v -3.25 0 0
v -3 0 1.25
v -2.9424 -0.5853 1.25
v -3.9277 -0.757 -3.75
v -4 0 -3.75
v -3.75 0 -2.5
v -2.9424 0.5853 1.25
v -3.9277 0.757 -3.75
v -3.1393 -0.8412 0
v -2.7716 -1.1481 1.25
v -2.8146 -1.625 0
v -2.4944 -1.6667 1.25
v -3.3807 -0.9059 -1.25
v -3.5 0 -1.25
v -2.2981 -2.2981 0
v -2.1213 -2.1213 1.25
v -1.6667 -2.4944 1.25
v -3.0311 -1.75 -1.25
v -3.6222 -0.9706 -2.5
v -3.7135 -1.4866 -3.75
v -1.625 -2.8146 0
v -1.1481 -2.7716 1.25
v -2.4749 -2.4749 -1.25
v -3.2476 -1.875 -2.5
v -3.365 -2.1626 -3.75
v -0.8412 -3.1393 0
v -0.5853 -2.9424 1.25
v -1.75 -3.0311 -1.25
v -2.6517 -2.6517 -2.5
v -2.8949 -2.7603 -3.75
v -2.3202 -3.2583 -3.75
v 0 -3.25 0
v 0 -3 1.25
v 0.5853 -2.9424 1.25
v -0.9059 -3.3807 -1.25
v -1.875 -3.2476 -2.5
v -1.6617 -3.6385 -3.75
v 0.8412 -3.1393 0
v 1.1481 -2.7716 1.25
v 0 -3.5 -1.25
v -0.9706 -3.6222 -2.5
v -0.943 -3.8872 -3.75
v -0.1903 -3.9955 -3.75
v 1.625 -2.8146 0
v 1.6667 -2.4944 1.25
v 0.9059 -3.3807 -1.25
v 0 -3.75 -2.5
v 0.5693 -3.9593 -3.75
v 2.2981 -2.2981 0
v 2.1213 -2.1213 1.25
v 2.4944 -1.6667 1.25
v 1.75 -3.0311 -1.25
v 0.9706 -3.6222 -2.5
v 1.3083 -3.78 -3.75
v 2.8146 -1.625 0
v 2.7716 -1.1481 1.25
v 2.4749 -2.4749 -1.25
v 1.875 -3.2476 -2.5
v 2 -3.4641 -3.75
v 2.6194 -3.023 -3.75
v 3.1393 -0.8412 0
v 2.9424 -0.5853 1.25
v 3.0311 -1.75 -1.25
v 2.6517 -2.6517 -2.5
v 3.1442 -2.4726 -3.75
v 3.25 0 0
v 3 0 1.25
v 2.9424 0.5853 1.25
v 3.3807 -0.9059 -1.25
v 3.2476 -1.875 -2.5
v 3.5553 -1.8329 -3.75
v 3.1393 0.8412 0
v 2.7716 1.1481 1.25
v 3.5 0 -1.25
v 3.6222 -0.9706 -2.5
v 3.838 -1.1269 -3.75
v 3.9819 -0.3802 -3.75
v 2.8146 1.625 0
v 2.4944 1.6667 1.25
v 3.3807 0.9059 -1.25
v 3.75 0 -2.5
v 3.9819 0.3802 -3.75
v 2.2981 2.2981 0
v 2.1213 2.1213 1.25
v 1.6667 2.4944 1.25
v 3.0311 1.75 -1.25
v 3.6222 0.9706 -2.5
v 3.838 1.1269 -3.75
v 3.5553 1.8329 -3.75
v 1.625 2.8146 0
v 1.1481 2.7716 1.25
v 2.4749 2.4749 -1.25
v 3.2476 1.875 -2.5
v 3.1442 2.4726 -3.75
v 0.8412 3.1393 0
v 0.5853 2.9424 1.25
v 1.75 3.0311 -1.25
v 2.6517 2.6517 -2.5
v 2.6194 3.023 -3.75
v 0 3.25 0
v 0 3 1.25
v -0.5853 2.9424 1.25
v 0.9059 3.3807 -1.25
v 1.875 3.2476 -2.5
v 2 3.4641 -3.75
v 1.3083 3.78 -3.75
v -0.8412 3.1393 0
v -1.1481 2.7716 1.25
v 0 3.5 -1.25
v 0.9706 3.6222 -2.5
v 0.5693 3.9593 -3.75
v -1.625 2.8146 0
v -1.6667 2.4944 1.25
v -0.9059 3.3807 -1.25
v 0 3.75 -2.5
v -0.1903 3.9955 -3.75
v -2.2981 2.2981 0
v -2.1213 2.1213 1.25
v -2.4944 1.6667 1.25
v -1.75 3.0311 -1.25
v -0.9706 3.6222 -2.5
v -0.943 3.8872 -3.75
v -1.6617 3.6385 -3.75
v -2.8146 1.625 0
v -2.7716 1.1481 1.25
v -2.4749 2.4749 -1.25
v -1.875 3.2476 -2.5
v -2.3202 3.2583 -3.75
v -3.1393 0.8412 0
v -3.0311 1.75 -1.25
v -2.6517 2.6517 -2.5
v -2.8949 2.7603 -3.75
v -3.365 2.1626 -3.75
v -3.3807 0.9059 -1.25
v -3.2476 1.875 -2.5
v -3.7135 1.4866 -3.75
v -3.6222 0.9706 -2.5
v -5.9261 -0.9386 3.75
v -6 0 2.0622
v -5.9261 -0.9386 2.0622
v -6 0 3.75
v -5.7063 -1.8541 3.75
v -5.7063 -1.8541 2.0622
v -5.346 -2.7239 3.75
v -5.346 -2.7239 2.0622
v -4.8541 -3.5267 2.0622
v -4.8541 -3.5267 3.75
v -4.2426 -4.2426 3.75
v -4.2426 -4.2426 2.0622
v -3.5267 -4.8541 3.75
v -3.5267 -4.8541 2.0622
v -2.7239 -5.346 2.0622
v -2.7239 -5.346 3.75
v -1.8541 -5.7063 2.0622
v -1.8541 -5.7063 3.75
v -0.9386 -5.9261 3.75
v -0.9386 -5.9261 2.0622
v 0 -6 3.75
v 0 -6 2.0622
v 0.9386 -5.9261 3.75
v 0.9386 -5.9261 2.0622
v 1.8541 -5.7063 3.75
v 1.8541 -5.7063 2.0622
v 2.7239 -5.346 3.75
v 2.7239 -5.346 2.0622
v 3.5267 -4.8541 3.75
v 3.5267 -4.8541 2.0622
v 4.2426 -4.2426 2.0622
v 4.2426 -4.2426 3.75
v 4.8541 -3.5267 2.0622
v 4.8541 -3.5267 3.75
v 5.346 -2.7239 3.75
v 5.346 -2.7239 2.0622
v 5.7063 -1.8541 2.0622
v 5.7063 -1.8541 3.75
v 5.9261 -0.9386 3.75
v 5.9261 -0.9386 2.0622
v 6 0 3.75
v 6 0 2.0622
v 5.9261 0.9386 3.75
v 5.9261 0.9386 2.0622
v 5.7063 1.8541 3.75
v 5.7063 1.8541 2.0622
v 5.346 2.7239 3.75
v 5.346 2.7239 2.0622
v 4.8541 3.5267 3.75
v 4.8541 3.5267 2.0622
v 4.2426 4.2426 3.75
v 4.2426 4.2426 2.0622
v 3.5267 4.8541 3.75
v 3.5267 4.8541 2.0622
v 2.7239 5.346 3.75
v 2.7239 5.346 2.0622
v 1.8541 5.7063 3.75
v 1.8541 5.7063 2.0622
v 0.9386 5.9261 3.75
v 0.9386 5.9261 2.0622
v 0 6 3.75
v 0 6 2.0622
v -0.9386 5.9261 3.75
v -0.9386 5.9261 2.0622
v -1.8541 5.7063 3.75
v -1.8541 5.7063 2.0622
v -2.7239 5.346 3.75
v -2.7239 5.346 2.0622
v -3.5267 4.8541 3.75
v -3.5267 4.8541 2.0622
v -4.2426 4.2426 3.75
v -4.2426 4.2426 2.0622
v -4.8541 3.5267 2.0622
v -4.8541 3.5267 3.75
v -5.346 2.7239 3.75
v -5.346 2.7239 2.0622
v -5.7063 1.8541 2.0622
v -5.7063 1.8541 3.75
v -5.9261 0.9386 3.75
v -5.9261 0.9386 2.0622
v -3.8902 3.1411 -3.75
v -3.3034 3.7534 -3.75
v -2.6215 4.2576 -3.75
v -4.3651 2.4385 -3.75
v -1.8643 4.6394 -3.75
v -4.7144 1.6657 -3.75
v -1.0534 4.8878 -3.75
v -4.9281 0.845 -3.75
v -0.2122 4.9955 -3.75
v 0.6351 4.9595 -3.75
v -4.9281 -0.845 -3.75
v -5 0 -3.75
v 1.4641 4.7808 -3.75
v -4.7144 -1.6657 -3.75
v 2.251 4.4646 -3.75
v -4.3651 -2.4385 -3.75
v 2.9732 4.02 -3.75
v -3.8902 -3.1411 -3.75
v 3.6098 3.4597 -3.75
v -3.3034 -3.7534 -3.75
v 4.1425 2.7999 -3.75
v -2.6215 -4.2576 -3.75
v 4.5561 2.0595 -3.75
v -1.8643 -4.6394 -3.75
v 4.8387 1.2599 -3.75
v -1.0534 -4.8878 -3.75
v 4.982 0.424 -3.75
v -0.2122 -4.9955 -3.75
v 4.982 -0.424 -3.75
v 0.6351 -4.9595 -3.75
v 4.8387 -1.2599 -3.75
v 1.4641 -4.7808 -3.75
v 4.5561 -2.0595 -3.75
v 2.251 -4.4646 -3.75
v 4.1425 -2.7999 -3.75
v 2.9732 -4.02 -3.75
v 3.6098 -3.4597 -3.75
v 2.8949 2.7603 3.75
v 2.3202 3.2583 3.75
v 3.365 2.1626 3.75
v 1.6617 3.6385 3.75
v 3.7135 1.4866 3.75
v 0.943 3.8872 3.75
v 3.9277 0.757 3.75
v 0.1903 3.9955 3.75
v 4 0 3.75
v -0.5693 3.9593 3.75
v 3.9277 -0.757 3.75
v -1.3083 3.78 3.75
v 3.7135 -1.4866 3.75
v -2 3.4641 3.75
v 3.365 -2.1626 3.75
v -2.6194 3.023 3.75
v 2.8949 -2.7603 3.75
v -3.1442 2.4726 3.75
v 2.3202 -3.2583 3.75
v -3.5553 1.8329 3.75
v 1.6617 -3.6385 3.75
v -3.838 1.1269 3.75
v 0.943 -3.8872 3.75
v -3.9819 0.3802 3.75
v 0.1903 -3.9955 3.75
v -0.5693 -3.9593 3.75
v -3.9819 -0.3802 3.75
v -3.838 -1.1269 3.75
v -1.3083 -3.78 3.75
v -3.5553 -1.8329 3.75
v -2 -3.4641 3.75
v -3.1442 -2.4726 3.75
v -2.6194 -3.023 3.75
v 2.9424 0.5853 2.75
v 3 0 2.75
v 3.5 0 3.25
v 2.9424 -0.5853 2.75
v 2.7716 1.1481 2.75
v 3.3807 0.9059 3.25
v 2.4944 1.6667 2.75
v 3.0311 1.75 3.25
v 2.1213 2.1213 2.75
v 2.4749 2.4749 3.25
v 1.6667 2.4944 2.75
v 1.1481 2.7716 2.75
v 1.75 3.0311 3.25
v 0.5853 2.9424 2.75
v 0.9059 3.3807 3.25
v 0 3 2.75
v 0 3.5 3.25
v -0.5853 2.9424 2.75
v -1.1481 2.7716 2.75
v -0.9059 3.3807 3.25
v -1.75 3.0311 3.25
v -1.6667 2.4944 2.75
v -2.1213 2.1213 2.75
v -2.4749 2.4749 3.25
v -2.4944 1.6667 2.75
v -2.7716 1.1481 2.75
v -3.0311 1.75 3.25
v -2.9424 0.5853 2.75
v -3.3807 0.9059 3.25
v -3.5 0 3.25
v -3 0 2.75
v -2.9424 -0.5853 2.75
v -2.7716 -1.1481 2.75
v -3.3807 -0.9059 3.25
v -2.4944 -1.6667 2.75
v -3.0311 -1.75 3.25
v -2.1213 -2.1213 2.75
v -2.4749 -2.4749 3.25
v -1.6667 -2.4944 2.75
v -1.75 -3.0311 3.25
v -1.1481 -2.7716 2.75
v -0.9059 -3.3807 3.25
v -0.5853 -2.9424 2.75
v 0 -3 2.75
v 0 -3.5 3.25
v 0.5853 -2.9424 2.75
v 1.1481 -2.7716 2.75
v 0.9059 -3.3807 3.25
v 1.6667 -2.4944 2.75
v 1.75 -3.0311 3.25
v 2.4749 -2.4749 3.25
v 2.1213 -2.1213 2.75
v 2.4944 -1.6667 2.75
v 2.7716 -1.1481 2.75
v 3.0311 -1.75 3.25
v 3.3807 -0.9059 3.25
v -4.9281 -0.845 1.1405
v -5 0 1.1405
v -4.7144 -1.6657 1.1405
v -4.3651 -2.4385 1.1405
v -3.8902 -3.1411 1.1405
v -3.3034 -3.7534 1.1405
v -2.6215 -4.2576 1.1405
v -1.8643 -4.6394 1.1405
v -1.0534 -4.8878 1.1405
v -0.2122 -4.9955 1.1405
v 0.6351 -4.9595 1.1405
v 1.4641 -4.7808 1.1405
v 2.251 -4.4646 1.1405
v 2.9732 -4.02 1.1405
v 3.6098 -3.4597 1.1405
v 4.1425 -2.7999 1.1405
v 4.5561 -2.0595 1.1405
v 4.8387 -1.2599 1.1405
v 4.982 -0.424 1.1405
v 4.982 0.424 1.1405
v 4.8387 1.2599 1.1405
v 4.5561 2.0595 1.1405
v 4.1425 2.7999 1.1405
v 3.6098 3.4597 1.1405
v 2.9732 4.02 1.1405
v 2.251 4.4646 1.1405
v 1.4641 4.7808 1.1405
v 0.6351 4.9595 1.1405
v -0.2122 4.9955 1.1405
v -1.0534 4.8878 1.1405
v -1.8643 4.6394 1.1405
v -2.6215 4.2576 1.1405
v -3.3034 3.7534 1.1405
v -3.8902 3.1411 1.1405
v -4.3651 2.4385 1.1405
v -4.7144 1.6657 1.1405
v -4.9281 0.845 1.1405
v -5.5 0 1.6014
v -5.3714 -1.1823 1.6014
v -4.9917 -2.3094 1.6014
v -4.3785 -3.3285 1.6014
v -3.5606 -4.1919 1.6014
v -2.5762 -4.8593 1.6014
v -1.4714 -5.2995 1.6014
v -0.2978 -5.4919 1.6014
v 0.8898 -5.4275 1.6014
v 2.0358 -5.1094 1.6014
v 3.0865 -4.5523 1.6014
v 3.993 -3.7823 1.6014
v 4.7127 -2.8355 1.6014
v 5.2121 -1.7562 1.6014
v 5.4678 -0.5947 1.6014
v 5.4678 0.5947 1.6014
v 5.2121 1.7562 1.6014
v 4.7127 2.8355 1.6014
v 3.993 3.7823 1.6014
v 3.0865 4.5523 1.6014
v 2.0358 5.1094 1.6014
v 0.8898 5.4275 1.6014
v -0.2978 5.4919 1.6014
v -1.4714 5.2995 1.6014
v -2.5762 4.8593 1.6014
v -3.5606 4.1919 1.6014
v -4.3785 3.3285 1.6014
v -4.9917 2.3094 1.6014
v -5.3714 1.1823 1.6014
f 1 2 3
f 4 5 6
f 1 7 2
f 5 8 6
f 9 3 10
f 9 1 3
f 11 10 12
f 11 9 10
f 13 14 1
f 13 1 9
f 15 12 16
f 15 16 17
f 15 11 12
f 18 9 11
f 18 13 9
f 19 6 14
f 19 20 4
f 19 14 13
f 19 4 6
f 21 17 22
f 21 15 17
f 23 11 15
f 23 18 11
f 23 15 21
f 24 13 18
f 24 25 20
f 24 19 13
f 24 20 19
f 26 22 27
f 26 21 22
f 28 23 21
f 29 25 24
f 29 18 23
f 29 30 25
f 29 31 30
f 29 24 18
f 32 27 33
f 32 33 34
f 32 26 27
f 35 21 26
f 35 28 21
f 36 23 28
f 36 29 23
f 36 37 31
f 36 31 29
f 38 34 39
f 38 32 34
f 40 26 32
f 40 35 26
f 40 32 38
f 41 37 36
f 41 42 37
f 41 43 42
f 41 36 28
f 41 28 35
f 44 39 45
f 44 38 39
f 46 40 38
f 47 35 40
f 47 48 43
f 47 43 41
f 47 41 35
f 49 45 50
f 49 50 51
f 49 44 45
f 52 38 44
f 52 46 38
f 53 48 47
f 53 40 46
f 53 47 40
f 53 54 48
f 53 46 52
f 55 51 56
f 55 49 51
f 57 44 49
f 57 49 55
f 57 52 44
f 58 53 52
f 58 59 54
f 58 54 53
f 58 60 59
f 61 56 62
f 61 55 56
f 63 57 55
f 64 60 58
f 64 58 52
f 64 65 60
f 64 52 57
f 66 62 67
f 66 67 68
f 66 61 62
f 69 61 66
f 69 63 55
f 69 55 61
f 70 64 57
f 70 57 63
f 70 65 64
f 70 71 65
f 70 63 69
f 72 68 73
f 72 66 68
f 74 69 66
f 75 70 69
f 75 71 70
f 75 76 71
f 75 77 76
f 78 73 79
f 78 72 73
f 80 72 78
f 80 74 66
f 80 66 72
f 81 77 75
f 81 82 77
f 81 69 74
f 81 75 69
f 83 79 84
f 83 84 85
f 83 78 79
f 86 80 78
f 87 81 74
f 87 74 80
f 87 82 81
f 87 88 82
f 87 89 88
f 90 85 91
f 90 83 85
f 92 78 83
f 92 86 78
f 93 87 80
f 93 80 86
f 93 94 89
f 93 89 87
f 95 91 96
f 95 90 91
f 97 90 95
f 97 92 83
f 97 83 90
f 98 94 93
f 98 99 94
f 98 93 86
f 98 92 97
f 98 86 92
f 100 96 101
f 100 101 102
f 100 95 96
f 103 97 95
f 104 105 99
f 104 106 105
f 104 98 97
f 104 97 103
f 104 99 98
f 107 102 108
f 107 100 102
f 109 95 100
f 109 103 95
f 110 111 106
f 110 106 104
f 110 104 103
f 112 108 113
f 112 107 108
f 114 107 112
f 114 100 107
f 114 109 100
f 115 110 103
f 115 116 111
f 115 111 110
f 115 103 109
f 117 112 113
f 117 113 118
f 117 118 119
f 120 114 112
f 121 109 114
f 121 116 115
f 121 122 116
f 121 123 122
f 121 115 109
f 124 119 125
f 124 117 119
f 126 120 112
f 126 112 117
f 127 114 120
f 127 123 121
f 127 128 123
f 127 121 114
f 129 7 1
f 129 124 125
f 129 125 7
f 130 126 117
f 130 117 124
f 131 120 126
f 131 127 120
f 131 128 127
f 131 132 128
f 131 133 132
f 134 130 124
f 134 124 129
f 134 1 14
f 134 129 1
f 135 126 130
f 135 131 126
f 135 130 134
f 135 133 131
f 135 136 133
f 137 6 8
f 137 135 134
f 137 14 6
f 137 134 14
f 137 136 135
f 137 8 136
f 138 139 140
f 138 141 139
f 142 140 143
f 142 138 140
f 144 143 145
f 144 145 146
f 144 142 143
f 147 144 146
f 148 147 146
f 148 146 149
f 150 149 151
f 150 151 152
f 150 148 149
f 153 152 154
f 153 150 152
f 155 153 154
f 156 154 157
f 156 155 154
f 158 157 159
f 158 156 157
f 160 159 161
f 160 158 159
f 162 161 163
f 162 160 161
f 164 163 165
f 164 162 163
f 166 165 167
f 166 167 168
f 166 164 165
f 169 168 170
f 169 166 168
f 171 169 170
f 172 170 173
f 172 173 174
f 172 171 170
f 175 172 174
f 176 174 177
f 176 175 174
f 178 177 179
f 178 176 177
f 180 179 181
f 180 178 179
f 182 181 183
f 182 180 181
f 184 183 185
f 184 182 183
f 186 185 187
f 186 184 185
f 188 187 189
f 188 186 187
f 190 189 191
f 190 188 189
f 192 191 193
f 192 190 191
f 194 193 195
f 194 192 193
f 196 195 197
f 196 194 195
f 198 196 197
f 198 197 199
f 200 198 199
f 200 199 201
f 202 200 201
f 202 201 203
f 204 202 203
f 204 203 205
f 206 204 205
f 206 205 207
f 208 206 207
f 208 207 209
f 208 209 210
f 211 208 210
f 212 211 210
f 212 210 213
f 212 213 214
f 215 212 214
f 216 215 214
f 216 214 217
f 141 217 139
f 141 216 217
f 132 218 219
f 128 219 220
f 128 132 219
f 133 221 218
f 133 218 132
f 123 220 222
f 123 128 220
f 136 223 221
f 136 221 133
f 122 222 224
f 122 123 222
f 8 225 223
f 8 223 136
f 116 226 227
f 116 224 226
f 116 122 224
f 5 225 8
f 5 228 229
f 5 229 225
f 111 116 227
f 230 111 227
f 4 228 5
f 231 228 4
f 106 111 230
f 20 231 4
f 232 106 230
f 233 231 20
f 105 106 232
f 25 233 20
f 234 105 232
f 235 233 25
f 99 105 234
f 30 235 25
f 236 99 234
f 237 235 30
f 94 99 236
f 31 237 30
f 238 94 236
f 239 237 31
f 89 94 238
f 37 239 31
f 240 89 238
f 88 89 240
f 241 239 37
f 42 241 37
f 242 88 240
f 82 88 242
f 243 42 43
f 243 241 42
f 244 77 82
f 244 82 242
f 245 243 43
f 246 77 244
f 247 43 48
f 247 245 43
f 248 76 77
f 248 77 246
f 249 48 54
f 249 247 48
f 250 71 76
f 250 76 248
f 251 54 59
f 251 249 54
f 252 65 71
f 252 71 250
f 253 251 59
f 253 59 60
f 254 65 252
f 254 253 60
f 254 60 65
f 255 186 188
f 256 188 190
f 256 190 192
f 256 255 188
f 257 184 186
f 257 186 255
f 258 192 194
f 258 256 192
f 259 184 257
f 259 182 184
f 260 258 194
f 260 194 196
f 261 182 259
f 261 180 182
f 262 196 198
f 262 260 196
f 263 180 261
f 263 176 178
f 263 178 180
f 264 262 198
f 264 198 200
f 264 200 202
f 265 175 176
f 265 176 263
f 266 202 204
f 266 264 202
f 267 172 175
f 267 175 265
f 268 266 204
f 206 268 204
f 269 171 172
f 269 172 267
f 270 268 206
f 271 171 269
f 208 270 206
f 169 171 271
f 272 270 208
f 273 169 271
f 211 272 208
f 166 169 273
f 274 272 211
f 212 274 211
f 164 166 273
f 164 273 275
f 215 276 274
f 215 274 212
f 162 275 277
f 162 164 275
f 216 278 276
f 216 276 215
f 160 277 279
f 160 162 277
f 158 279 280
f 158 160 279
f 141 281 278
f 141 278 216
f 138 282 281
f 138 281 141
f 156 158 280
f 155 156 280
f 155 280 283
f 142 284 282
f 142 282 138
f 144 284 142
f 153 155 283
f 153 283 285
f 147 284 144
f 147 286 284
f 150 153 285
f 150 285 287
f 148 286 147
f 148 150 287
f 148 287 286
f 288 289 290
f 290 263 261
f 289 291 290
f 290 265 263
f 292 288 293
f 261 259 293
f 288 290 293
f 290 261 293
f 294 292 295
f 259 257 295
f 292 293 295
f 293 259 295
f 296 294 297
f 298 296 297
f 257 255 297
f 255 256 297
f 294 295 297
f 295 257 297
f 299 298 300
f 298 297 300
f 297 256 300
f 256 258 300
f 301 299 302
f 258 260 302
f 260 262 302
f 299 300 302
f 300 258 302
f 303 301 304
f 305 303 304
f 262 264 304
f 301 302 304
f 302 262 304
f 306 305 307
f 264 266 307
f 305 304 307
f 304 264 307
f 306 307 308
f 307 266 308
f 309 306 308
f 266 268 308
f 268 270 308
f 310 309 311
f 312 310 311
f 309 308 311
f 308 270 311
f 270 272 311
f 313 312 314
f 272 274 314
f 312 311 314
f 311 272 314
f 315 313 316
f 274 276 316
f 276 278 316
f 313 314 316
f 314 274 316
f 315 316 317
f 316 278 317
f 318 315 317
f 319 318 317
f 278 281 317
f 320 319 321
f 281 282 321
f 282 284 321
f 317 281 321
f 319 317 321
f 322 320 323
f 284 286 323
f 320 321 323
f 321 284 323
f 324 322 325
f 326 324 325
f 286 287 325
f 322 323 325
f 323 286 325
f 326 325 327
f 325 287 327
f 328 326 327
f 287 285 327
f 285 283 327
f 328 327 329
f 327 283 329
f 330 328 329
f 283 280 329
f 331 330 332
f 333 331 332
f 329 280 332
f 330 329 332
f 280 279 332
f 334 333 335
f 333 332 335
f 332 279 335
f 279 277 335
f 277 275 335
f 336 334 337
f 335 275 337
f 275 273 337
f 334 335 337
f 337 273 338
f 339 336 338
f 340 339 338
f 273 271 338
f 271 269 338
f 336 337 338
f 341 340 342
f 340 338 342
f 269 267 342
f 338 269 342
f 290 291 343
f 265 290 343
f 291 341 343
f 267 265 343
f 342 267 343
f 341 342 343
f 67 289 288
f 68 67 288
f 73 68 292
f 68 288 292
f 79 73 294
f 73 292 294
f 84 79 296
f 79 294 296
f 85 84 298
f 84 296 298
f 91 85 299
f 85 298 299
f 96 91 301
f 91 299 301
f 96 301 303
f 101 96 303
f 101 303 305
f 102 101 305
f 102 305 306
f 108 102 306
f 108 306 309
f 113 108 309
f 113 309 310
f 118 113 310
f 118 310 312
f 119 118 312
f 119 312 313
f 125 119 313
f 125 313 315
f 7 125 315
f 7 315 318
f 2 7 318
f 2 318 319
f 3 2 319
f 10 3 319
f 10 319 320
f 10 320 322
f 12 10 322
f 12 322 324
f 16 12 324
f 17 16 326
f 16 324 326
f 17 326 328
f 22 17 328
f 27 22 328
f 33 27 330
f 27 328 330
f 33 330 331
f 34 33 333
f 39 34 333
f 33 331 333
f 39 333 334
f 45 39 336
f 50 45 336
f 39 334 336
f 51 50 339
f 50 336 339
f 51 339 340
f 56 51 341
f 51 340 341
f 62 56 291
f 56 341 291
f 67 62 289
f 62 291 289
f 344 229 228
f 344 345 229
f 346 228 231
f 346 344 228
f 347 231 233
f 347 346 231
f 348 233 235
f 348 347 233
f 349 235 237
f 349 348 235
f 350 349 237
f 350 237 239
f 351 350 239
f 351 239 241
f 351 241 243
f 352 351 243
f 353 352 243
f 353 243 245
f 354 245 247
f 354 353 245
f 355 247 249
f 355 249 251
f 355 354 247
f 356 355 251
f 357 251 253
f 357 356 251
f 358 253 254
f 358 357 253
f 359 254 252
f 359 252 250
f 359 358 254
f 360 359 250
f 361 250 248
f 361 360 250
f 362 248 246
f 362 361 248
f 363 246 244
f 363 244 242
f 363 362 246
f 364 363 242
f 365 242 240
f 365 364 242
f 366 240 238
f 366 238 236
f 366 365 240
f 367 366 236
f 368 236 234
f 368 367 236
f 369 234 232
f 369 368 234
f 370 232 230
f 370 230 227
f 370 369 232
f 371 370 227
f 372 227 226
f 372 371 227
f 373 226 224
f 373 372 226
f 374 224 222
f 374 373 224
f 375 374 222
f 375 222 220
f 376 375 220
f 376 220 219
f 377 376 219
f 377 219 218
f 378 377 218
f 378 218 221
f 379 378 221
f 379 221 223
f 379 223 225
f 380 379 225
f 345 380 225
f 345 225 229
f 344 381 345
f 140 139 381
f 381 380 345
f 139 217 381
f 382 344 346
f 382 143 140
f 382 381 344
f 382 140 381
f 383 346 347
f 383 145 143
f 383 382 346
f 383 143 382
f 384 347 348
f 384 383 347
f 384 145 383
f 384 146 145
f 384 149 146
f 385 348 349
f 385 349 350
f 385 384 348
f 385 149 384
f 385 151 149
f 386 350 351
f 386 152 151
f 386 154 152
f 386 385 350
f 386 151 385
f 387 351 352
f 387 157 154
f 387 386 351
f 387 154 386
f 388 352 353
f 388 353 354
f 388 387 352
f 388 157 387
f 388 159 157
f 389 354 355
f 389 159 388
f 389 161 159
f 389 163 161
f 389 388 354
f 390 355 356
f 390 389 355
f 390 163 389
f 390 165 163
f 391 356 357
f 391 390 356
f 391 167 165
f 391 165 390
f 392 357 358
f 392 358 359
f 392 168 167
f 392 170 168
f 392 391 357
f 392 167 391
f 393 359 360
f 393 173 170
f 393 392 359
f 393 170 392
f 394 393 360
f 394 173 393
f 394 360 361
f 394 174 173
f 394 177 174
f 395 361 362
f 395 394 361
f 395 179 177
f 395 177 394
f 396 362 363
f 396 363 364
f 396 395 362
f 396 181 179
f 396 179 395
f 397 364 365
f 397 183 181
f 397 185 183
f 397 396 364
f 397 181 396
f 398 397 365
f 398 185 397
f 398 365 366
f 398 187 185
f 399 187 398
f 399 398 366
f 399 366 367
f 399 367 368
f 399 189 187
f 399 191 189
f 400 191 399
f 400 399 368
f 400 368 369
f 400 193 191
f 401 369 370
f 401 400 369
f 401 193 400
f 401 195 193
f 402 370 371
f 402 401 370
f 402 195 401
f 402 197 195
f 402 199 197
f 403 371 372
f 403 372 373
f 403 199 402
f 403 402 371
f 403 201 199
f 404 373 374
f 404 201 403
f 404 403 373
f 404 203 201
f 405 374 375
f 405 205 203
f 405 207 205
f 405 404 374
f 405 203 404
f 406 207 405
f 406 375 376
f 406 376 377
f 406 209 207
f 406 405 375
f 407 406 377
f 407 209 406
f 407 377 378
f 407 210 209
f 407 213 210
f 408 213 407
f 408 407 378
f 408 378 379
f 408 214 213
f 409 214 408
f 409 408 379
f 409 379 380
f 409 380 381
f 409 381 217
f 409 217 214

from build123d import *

# Parameters (mm, degrees)
CROQUIS2_R            = 3
CORTAR_EXTRUIR1_DEPTH = 10
CHAFL_N1_SIZE         = 1


with BuildPart() as part:
    # Croquis1 → Revolución1 (revolve)
    with BuildSketch(Plane(origin=(0, 0, 0), x_dir=(1, 0, 0), z_dir=(0, 1, 0))):
        Polygon((-3, -1.25), (-4, 3.75), (-5, 3.75), (-5, -1.140510949), (-6, -2.062248439), (-6, -3.75), (0, -3.75), (0, -1.25), align=None)
    revolve(axis=Axis((0, 0, -3.75), (0, 0, 1)))

    # Croquis2 → Cortar-Extruir1 (cut)
    with BuildSketch(Plane.XY.offset(3.75)):
        Circle(CROQUIS2_R)
    extrude(amount=-CORTAR_EXTRUIR1_DEPTH, mode=Mode.SUBTRACT)

    # Chaflán1
    chafl_n1_edges = [part.edges().sort_by_distance(p)[0] for p in [
        (-3, 0, 3.75),
    ]]
    chamfer(chafl_n1_edges, length=CHAFL_N1_SIZE)


solid = part.part
